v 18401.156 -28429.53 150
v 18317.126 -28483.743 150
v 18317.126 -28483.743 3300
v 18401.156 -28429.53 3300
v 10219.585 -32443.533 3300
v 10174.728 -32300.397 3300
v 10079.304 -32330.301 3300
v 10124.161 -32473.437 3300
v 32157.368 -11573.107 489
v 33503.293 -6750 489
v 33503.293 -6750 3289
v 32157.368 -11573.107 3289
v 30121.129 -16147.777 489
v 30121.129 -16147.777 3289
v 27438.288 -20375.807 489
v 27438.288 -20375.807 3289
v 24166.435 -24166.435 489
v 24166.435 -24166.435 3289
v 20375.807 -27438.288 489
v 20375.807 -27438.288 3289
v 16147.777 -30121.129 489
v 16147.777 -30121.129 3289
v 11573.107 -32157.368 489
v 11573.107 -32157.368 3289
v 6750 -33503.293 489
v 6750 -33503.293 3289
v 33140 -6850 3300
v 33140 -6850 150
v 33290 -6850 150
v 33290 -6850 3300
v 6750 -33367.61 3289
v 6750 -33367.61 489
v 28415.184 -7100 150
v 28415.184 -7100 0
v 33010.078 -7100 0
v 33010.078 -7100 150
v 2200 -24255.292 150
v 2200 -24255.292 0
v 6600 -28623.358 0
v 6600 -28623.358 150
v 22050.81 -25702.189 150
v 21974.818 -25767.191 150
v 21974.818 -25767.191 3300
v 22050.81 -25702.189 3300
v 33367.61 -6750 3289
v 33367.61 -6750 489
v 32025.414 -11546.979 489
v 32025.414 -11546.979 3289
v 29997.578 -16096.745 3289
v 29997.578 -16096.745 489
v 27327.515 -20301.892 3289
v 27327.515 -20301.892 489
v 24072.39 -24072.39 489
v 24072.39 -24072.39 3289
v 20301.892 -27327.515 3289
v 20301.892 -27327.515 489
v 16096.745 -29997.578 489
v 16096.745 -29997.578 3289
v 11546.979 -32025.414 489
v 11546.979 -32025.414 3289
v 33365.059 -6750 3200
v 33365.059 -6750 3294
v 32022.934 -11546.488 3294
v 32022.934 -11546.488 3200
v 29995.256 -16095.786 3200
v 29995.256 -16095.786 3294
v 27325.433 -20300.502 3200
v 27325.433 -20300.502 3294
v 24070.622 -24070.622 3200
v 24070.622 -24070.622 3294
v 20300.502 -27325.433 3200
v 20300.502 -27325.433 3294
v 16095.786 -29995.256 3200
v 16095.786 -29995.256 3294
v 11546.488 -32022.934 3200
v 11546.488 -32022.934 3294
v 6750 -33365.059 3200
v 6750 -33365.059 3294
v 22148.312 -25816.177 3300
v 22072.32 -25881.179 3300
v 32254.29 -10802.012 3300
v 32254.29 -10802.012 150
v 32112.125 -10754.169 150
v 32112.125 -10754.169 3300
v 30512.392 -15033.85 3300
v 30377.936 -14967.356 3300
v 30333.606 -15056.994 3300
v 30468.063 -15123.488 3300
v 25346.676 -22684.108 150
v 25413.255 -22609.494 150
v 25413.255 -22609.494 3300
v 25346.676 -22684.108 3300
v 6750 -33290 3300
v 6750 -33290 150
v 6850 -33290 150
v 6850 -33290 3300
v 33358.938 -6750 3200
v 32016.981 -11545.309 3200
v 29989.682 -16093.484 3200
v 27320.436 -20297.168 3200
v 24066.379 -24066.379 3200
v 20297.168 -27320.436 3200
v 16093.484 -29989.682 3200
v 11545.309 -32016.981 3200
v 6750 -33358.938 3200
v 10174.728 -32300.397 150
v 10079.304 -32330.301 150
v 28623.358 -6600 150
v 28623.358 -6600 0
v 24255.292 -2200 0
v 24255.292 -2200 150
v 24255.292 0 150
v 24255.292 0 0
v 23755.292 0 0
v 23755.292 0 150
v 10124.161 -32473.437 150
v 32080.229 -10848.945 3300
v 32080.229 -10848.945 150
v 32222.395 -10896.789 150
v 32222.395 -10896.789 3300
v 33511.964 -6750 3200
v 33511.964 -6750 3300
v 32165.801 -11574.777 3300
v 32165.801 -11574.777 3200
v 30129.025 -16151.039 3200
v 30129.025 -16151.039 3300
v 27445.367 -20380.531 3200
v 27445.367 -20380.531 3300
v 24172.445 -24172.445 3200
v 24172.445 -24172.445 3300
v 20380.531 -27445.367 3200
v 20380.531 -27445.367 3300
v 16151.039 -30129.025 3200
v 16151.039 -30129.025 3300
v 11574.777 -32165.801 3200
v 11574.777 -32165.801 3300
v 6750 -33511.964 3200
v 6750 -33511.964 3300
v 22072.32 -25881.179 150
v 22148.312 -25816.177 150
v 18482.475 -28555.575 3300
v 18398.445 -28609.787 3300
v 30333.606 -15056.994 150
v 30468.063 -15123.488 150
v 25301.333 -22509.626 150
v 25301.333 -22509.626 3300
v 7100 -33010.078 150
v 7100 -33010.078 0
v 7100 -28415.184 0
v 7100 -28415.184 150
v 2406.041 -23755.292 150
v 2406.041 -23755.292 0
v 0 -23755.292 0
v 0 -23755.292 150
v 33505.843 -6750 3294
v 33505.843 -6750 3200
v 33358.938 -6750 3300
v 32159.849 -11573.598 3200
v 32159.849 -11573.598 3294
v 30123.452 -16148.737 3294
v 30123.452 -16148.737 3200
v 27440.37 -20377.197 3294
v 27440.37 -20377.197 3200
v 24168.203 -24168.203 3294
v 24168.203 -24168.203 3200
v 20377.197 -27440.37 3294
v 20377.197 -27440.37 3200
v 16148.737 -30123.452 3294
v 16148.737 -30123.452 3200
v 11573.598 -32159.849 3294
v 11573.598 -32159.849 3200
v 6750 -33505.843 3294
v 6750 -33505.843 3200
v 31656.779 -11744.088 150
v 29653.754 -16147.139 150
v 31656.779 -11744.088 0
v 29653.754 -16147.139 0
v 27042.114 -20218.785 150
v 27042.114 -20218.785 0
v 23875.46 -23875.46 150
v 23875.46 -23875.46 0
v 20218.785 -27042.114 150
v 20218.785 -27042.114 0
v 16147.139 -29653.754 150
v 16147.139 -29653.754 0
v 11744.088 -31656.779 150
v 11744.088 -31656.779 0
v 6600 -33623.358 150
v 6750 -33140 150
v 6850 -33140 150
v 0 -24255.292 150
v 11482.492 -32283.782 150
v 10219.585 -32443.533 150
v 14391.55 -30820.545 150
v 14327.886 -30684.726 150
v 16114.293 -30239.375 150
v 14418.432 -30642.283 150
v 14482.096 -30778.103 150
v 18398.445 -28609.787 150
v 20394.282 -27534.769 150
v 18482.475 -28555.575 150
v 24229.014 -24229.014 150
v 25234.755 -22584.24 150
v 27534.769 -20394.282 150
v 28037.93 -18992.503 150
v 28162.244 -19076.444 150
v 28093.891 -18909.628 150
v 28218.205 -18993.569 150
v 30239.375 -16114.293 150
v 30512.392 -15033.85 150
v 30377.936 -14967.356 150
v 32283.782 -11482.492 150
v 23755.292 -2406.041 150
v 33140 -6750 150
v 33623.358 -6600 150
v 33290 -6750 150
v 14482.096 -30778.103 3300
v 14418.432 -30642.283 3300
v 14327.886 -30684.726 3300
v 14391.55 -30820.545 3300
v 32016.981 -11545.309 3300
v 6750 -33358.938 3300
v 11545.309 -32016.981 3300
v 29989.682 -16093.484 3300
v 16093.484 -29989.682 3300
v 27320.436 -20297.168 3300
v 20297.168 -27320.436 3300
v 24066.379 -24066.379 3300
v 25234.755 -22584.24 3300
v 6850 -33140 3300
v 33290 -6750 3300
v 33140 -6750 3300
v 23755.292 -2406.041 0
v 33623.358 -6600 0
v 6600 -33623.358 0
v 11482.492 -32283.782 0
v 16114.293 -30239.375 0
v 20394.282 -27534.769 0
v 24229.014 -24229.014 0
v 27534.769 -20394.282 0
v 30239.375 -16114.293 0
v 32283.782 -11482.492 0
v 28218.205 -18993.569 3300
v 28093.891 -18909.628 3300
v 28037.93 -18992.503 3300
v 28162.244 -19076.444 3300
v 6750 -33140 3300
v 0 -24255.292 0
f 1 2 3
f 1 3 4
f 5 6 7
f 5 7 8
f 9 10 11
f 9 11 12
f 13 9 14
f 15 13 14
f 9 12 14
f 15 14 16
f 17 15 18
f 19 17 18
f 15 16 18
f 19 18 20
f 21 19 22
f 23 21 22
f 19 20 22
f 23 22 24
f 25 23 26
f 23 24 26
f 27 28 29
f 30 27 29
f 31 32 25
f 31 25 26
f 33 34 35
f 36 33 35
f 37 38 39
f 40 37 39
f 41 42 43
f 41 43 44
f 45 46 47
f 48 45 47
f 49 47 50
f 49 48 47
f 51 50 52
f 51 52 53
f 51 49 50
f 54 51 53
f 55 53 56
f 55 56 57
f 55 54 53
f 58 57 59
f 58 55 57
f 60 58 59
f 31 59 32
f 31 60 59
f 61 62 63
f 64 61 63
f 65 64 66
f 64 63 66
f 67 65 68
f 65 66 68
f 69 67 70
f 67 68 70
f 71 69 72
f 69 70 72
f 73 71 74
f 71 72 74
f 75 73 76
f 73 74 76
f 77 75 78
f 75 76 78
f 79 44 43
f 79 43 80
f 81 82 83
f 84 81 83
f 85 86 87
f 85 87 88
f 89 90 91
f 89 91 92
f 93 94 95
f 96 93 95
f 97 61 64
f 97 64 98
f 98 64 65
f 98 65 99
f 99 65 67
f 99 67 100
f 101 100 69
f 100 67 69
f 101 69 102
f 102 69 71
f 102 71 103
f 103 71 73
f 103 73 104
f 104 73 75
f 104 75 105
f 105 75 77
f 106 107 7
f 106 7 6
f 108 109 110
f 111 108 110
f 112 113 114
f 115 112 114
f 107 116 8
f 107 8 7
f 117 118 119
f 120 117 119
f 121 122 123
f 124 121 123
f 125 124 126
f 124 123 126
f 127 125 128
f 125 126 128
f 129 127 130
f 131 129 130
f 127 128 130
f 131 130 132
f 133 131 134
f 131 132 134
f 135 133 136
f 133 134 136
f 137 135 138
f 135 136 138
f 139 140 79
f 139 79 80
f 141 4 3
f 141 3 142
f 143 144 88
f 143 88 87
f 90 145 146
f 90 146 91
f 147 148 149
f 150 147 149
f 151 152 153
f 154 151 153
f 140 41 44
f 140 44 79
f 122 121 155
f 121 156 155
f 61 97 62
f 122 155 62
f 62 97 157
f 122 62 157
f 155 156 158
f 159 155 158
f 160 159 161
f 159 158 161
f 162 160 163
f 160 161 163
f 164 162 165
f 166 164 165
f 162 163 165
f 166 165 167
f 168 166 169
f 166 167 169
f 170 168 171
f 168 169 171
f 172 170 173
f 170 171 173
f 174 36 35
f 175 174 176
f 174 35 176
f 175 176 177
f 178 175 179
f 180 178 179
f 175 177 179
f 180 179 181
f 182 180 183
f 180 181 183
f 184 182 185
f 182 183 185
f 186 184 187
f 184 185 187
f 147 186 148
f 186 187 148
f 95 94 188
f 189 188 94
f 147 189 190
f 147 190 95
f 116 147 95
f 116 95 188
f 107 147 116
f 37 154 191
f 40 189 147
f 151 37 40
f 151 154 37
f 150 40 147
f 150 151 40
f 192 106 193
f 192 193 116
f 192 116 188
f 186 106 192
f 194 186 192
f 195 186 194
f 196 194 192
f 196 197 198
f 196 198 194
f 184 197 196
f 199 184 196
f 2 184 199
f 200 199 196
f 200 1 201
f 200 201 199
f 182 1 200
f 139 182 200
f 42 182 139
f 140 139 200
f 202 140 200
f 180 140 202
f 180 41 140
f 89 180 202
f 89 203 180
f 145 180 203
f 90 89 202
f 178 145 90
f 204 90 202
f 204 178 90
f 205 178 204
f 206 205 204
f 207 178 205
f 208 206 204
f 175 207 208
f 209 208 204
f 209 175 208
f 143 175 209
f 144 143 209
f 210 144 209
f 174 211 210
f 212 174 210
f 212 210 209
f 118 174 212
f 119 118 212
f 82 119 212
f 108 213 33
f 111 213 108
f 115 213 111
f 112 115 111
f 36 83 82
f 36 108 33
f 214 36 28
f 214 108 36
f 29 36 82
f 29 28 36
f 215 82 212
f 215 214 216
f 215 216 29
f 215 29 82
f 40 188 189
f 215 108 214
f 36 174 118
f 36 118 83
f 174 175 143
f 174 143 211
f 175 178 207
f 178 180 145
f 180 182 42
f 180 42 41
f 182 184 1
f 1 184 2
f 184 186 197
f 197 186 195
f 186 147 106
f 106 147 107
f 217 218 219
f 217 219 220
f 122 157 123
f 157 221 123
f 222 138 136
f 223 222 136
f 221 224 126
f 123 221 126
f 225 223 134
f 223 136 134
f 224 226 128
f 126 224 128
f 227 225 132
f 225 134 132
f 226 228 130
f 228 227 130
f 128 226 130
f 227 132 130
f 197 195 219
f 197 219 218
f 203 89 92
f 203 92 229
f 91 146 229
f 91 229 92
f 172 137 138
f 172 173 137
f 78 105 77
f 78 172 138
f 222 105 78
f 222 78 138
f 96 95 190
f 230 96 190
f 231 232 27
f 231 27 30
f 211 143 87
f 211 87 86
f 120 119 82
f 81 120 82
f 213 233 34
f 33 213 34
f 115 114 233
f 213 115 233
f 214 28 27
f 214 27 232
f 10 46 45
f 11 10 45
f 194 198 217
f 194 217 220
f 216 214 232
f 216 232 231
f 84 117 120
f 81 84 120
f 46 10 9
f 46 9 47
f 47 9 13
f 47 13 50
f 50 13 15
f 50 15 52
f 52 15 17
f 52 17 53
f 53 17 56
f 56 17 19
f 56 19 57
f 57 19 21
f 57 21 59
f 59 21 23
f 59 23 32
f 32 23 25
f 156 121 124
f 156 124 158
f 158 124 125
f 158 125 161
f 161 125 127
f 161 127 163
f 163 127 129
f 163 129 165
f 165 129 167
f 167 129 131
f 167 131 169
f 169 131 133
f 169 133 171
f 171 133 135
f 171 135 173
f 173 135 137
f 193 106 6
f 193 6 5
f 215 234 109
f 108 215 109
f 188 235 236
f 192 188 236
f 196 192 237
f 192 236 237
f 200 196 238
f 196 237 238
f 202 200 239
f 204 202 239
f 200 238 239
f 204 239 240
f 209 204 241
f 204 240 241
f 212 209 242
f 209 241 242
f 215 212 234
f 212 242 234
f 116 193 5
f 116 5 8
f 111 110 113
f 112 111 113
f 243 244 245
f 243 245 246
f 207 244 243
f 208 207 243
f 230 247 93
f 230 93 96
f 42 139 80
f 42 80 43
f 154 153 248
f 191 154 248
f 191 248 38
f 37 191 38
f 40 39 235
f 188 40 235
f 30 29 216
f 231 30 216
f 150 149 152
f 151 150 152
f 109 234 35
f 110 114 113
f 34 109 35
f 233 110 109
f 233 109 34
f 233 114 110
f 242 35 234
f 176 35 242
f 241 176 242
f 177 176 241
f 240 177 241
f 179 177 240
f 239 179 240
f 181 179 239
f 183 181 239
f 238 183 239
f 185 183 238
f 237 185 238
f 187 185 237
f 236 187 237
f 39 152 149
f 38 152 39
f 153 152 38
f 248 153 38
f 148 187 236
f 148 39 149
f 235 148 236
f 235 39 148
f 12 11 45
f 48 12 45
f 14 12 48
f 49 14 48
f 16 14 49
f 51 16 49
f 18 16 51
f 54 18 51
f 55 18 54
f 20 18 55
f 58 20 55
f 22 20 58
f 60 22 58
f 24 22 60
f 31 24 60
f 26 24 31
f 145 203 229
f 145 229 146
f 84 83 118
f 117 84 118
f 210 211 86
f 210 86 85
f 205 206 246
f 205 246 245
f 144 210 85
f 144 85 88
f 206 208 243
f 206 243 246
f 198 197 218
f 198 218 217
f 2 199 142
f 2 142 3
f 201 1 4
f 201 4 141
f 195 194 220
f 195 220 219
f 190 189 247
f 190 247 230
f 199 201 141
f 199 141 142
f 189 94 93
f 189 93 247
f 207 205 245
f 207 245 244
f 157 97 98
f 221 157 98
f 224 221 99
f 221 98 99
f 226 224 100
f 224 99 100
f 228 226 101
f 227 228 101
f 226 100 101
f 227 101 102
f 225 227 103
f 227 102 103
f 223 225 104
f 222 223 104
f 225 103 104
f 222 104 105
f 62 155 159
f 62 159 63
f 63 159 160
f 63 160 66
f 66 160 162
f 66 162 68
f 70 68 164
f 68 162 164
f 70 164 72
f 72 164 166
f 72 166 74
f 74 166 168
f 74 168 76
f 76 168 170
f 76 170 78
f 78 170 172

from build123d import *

# Parameters (mm, degrees)
F2_DEPTH  = 150
F3_W      = 150
F3_H      = 100
F3_W_2    = 100
F3_H_2    = 150
F4_DEPTH  = 3300
F7_DEPTH  = 3300
F9_ANGLE  = 90
F10_W     = 133
F10_H     = 2800
F11_ANGLE = 90
F12_W     = 6750
F12_H     = 3694.4781839848
F13_DEPTH = 34185.001
F14_W     = 6750
F14_H     = 4040.5442416668
F15_DEPTH = 34185.001


# Not quite as in the source:
# - a pattern or mirror of a feature is missing from the dataset's text; its kind, count and spacing are read off the source's solid


with BuildPart() as f2:
    # F1 (on Top) → F2 (new body)
    with BuildSketch(Plane.XY):
        with BuildLine():
            Line((6600, -28623.3583242364), (6600, -33623.3583242364))
            ThreePointArc((6600, -33623.3583242364), (24229.0138573571, -24229.0138573571), (33623.3583242364, -6600))
            Line((33623.3583242364, -6600), (28623.3583242364, -6600))
            Line((28623.3583242364, -6600), (24255.2923906681, -2200))
            Line((24255.2923906681, -2200), (24255.2923906681, 0))
            Line((24255.2923906681, 0), (23755.2923906681, 0))
            Line((23755.2923906681, 0), (23755.2923906681, -2406.040845923))
            Line((23755.2923906681, -2406.040845923), (28415.1839985056, -7100))
            Line((28415.1839985056, -7100), (33010.0776279002, -7100))
            ThreePointArc((33010.0776279002, -7100), (23875.4604667638, -23875.4604667638), (7100, -33010.0776279002))
            Line((7100, -33010.0776279002), (7100, -28415.1839985056))
            Line((7100, -28415.1839985056), (2406.040845923, -23755.2923906681))
            Line((2406.040845923, -23755.2923906681), (0, -23755.2923906681))
            Line((0, -23755.2923906681), (0, -24255.2923906681))
            Line((0, -24255.2923906681), (2200, -24255.2923906681))
            Line((2200, -24255.2923906681), (6600, -28623.3583242364))
        make_face()
    extrude(amount=F2_DEPTH)

    # F3 (on Top) → F4 (join)
    with BuildSketch(Plane.XY):
        with Locations((33215, -6800)):
            Rectangle(F3_W, F3_H)
        with Locations((6800, -33215)):
            Rectangle(F3_W_2, F3_H_2)
    extrude(amount=F4_DEPTH)

    # F6 (on Top) → F7 (join)
    with BuildSketch(Plane.XY):
        Polygon((32112.1251704395, -10754.1685888787), (32096.1772049746, -10801.5570093792), (32080.2292395097, -10848.9454298796), (32222.3945010112, -10896.7893262743), (32238.3424664761, -10849.4009057739), (32254.290431941, -10802.0124852734), align=None)
    f7 = extrude(amount=F7_DEPTH)

    # F7_copies: F7 across plane
    add(f7.mirror(Plane(origin=(0, 0, 0), x_dir=(-0.9241655206, 0.3819922651, 0), z_dir=(-0.3819922651, -0.9241655206, 0))))

    # F7_copies1: F7 across plane
    add(f7.mirror(Plane(origin=(0, 0, 0), x_dir=(-0.8963759304, 0.4432947005, 0), z_dir=(-0.4432947005, -0.8963759304, 0))))

    # F7_copies2: F7 across plane
    add(f7.mirror(Plane(origin=(0, 0, 0), x_dir=(-0.8645255332, 0.5025889001, 0), z_dir=(-0.5025889001, -0.8645255332, 0))))

    # F7_copies3: F7 across plane
    add(f7.mirror(Plane(origin=(0, 0, 0), x_dir=(-0.8287586193, 0.5596062464, 0), z_dir=(-0.5596062464, -0.8287586193, 0))))

    # F7_copies4: F7 across plane
    add(f7.mirror(Plane(origin=(0, 0, 0), x_dir=(-0.7892372217, 0.6140884365, 0), z_dir=(-0.6140884365, -0.7892372217, 0))))

    # F7_copies5: F7 across plane
    add(f7.mirror(Plane(origin=(0, 0, 0), x_dir=(-0.7461403823, 0.6657886526, 0), z_dir=(-0.6657886526, -0.7461403823, 0))))

    # F7_copies6: F7 across plane
    add(f7.mirror(Plane(origin=(0, 0, 0), x_dir=(0.6996633405, -0.7144726796, 0), z_dir=(-0.7144726796, -0.6996633405, 0))))


with BuildPart() as f9:
    # F8 (on Front) → F9 (revolve)
    with BuildSketch(Plane.XZ):
        Polygon((34185, 3300), (34035, 3300), (34035, 3200), (34041, 3200), (34041, 3294), (34179, 3294), (34179, 3200), (34185, 3200), align=None)
    revolve(axis=Axis((0, 0, 3739.7677898407), (0, 0, -1)), revolution_arc=F9_ANGLE)


with BuildPart() as f11:
    # F10 (on Front) → F11 (revolve)
    with BuildSketch(Plane.XZ):
        with Locations((34110, 1889)):
            Rectangle(F10_W, F10_H)
    revolve(axis=Axis((0, 0, 3739.7677898407), (0, 0, -1)), revolution_arc=F11_ANGLE)


with BuildPart() as f13_tool:
    # F12 (on Front) → F13 (new body, through all)
    with BuildSketch(Plane.XZ):
        with Locations((3375, 2133.2916468382)):
            Rectangle(F12_W, F12_H)
    extrude(amount=F13_DEPTH)


with BuildPart() as f9_1:
    add(f9.part)

    # F13: cut by f13_tool
    add(f13_tool.part, mode=Mode.SUBTRACT)


with BuildPart() as f11_1:
    add(f11.part)

    # F13: cut by f13_tool
    add(f13_tool.part, mode=Mode.SUBTRACT)


with BuildPart() as f15_tool:
    # F14 (on Right) → F15 (new body, through all)
    with BuildSketch(Plane.YZ):
        with Locations((-3375, 2345.6932455301)):
            Rectangle(F14_W, F14_H)
    extrude(amount=F15_DEPTH)


with BuildPart() as f9_2:
    add(f9_1.part)

    # F15: cut by f15_tool
    add(f15_tool.part, mode=Mode.SUBTRACT)


with BuildPart() as f11_2:
    add(f11_1.part)

    # F15: cut by f15_tool
    add(f15_tool.part, mode=Mode.SUBTRACT)


solid = Compound([f2.part, f9_2.part, f11_2.part])
